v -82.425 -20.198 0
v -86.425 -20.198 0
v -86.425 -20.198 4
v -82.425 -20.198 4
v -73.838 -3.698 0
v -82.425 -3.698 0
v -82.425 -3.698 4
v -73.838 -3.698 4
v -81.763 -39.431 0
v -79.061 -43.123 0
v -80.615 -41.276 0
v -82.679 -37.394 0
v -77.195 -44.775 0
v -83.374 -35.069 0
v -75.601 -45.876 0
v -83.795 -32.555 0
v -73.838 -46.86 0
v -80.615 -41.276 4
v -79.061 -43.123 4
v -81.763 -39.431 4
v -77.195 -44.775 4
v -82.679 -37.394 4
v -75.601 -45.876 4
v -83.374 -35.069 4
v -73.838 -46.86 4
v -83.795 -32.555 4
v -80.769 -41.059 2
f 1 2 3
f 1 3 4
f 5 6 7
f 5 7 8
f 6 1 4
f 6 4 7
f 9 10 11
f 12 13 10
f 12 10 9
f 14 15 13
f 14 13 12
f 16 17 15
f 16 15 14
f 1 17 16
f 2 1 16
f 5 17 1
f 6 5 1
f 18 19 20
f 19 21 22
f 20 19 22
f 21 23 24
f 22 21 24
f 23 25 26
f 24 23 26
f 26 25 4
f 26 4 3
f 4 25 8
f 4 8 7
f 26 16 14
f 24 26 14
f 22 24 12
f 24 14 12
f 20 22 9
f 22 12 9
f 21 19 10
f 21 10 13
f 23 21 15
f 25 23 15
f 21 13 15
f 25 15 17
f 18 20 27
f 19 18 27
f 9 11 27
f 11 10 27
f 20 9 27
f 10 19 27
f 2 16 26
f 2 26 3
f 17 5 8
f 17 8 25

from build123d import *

# Parameters (mm, degrees)
EXTRUDE_1_DEPTH = 4


with BuildPart() as part:
    # Эскиз1 → Бобышка-Вытянуть1 (new body)
    with BuildSketch(Plane.XY):
        with BuildLine():
            Line((-82.424778316, -3.697860687), (-73.838144401, -3.697860687))
            Line((-73.838144401, -3.697860687), (-73.838144401, -46.859686904))
            add(Edge.make_bspline(
                [(-83.795378854, -32.554799456), (-82.720974338, -42.41019878), (-73.838144401, -46.859686904)],
                knots=[0, 0, 0, 1, 1, 1], degree=2))
            Line((-83.795378854, -32.554799456), (-86.424778316, -20.197860687))
            Line((-86.424778316, -20.197860687), (-82.424778316, -20.197860687))
            Line((-82.424778316, -20.197860687), (-82.424778316, -3.697860687))
        make_face()
    extrude(amount=EXTRUDE_1_DEPTH)


solid = part.part
